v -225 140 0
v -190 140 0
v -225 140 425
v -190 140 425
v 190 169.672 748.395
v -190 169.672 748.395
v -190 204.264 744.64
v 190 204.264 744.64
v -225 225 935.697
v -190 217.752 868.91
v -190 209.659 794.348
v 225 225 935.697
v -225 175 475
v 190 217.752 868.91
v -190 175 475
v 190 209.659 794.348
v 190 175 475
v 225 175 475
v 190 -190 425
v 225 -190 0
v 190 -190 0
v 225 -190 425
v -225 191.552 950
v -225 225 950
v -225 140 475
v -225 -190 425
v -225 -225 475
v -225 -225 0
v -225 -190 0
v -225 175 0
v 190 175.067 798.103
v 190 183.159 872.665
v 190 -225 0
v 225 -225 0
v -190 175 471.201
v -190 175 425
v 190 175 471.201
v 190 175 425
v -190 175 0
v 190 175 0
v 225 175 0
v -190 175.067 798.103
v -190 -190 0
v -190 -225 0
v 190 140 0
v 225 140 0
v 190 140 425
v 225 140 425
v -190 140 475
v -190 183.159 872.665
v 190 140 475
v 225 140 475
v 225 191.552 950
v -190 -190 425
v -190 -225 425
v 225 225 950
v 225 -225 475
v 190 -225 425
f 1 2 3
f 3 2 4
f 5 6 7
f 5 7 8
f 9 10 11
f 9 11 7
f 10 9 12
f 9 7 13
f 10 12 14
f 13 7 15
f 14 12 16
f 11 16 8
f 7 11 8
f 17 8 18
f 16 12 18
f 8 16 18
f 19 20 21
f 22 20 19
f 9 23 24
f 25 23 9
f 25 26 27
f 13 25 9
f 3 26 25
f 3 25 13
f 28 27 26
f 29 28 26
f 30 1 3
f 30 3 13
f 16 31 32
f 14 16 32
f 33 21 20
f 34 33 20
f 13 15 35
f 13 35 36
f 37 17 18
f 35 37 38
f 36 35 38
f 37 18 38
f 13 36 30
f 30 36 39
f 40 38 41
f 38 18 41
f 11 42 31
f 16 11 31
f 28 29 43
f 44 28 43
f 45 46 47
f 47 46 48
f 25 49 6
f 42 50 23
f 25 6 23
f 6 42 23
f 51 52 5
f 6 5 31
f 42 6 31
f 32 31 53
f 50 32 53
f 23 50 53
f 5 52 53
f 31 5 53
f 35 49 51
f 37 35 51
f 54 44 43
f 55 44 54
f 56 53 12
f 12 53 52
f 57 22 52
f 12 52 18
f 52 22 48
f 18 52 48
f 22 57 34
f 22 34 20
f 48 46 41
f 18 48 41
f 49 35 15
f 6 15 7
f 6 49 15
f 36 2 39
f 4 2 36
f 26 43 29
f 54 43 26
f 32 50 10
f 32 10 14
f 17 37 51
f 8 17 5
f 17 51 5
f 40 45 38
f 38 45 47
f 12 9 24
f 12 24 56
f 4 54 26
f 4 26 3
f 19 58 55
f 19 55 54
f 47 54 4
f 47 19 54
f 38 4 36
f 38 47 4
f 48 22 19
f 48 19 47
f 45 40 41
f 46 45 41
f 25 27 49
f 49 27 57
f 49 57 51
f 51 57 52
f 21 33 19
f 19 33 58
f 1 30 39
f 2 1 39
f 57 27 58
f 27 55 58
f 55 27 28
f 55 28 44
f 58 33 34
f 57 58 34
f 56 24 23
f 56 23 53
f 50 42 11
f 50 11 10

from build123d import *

# Parameters (mm, degrees)
F0_W     = 450
F0_H     = 450
F1_DEPTH = 950
F2_W     = 50
F2_H     = 50
F2_H_2   = 425
F2_W_2   = 330
F3_DEPTH = 450.001
F4_W     = 380
F4_H     = 425
F5_DEPTH = 450.001
F6_W     = 380
F6_H     = 75
F6_H_2   = 275
F7_DEPTH = 135.7561676147


with BuildPart() as f1:
    # F0 (on Top) → F1 (new body)
    with BuildSketch(Plane.XY):
        Rectangle(F0_W, F0_H)
    extrude(amount=F1_DEPTH)

    # F2 (on face) → F3 (cut, through all)
    with BuildSketch(Plane.YZ.offset(225)):
        Polygon((-225, 950), (-225, 475), (140, 475), (191.5523596896, 950), align=None)
        Polygon((225, 935.6966614723), (175, 475), (225, 475), align=None)
        with Locations((200, 450)):
            Rectangle(F2_W, F2_H)
        with Locations((200, 212.5)):
            Rectangle(F2_W, F2_H_2)
        with Locations((-25, 212.5)):
            Rectangle(F2_W_2, F2_H_2)
    extrude(amount=-F3_DEPTH, mode=Mode.SUBTRACT)

    # F4 (on face) → F5 (cut, through all)
    with BuildSketch(Plane.XZ.offset(225)):
        with Locations((0, 212.5)):
            Rectangle(F4_W, F4_H)
    extrude(amount=-F5_DEPTH, mode=Mode.SUBTRACT)

    # F6 (on face) → F7 (cut, through all)
    with BuildSketch(Plane(origin=(0, 87.4179409303, -9.4875813351), x_dir=(1, 0, 0), z_dir=(0, -0.9941620044, 0.1078976784))):
        with Locations((0, 849.8326270669)):
            Rectangle(F6_W, F6_H)
        with Locations((0, 624.8326270669)):
            Rectangle(F6_W, F6_H_2)
    extrude(amount=-F7_DEPTH, mode=Mode.SUBTRACT)


solid = f1.part
